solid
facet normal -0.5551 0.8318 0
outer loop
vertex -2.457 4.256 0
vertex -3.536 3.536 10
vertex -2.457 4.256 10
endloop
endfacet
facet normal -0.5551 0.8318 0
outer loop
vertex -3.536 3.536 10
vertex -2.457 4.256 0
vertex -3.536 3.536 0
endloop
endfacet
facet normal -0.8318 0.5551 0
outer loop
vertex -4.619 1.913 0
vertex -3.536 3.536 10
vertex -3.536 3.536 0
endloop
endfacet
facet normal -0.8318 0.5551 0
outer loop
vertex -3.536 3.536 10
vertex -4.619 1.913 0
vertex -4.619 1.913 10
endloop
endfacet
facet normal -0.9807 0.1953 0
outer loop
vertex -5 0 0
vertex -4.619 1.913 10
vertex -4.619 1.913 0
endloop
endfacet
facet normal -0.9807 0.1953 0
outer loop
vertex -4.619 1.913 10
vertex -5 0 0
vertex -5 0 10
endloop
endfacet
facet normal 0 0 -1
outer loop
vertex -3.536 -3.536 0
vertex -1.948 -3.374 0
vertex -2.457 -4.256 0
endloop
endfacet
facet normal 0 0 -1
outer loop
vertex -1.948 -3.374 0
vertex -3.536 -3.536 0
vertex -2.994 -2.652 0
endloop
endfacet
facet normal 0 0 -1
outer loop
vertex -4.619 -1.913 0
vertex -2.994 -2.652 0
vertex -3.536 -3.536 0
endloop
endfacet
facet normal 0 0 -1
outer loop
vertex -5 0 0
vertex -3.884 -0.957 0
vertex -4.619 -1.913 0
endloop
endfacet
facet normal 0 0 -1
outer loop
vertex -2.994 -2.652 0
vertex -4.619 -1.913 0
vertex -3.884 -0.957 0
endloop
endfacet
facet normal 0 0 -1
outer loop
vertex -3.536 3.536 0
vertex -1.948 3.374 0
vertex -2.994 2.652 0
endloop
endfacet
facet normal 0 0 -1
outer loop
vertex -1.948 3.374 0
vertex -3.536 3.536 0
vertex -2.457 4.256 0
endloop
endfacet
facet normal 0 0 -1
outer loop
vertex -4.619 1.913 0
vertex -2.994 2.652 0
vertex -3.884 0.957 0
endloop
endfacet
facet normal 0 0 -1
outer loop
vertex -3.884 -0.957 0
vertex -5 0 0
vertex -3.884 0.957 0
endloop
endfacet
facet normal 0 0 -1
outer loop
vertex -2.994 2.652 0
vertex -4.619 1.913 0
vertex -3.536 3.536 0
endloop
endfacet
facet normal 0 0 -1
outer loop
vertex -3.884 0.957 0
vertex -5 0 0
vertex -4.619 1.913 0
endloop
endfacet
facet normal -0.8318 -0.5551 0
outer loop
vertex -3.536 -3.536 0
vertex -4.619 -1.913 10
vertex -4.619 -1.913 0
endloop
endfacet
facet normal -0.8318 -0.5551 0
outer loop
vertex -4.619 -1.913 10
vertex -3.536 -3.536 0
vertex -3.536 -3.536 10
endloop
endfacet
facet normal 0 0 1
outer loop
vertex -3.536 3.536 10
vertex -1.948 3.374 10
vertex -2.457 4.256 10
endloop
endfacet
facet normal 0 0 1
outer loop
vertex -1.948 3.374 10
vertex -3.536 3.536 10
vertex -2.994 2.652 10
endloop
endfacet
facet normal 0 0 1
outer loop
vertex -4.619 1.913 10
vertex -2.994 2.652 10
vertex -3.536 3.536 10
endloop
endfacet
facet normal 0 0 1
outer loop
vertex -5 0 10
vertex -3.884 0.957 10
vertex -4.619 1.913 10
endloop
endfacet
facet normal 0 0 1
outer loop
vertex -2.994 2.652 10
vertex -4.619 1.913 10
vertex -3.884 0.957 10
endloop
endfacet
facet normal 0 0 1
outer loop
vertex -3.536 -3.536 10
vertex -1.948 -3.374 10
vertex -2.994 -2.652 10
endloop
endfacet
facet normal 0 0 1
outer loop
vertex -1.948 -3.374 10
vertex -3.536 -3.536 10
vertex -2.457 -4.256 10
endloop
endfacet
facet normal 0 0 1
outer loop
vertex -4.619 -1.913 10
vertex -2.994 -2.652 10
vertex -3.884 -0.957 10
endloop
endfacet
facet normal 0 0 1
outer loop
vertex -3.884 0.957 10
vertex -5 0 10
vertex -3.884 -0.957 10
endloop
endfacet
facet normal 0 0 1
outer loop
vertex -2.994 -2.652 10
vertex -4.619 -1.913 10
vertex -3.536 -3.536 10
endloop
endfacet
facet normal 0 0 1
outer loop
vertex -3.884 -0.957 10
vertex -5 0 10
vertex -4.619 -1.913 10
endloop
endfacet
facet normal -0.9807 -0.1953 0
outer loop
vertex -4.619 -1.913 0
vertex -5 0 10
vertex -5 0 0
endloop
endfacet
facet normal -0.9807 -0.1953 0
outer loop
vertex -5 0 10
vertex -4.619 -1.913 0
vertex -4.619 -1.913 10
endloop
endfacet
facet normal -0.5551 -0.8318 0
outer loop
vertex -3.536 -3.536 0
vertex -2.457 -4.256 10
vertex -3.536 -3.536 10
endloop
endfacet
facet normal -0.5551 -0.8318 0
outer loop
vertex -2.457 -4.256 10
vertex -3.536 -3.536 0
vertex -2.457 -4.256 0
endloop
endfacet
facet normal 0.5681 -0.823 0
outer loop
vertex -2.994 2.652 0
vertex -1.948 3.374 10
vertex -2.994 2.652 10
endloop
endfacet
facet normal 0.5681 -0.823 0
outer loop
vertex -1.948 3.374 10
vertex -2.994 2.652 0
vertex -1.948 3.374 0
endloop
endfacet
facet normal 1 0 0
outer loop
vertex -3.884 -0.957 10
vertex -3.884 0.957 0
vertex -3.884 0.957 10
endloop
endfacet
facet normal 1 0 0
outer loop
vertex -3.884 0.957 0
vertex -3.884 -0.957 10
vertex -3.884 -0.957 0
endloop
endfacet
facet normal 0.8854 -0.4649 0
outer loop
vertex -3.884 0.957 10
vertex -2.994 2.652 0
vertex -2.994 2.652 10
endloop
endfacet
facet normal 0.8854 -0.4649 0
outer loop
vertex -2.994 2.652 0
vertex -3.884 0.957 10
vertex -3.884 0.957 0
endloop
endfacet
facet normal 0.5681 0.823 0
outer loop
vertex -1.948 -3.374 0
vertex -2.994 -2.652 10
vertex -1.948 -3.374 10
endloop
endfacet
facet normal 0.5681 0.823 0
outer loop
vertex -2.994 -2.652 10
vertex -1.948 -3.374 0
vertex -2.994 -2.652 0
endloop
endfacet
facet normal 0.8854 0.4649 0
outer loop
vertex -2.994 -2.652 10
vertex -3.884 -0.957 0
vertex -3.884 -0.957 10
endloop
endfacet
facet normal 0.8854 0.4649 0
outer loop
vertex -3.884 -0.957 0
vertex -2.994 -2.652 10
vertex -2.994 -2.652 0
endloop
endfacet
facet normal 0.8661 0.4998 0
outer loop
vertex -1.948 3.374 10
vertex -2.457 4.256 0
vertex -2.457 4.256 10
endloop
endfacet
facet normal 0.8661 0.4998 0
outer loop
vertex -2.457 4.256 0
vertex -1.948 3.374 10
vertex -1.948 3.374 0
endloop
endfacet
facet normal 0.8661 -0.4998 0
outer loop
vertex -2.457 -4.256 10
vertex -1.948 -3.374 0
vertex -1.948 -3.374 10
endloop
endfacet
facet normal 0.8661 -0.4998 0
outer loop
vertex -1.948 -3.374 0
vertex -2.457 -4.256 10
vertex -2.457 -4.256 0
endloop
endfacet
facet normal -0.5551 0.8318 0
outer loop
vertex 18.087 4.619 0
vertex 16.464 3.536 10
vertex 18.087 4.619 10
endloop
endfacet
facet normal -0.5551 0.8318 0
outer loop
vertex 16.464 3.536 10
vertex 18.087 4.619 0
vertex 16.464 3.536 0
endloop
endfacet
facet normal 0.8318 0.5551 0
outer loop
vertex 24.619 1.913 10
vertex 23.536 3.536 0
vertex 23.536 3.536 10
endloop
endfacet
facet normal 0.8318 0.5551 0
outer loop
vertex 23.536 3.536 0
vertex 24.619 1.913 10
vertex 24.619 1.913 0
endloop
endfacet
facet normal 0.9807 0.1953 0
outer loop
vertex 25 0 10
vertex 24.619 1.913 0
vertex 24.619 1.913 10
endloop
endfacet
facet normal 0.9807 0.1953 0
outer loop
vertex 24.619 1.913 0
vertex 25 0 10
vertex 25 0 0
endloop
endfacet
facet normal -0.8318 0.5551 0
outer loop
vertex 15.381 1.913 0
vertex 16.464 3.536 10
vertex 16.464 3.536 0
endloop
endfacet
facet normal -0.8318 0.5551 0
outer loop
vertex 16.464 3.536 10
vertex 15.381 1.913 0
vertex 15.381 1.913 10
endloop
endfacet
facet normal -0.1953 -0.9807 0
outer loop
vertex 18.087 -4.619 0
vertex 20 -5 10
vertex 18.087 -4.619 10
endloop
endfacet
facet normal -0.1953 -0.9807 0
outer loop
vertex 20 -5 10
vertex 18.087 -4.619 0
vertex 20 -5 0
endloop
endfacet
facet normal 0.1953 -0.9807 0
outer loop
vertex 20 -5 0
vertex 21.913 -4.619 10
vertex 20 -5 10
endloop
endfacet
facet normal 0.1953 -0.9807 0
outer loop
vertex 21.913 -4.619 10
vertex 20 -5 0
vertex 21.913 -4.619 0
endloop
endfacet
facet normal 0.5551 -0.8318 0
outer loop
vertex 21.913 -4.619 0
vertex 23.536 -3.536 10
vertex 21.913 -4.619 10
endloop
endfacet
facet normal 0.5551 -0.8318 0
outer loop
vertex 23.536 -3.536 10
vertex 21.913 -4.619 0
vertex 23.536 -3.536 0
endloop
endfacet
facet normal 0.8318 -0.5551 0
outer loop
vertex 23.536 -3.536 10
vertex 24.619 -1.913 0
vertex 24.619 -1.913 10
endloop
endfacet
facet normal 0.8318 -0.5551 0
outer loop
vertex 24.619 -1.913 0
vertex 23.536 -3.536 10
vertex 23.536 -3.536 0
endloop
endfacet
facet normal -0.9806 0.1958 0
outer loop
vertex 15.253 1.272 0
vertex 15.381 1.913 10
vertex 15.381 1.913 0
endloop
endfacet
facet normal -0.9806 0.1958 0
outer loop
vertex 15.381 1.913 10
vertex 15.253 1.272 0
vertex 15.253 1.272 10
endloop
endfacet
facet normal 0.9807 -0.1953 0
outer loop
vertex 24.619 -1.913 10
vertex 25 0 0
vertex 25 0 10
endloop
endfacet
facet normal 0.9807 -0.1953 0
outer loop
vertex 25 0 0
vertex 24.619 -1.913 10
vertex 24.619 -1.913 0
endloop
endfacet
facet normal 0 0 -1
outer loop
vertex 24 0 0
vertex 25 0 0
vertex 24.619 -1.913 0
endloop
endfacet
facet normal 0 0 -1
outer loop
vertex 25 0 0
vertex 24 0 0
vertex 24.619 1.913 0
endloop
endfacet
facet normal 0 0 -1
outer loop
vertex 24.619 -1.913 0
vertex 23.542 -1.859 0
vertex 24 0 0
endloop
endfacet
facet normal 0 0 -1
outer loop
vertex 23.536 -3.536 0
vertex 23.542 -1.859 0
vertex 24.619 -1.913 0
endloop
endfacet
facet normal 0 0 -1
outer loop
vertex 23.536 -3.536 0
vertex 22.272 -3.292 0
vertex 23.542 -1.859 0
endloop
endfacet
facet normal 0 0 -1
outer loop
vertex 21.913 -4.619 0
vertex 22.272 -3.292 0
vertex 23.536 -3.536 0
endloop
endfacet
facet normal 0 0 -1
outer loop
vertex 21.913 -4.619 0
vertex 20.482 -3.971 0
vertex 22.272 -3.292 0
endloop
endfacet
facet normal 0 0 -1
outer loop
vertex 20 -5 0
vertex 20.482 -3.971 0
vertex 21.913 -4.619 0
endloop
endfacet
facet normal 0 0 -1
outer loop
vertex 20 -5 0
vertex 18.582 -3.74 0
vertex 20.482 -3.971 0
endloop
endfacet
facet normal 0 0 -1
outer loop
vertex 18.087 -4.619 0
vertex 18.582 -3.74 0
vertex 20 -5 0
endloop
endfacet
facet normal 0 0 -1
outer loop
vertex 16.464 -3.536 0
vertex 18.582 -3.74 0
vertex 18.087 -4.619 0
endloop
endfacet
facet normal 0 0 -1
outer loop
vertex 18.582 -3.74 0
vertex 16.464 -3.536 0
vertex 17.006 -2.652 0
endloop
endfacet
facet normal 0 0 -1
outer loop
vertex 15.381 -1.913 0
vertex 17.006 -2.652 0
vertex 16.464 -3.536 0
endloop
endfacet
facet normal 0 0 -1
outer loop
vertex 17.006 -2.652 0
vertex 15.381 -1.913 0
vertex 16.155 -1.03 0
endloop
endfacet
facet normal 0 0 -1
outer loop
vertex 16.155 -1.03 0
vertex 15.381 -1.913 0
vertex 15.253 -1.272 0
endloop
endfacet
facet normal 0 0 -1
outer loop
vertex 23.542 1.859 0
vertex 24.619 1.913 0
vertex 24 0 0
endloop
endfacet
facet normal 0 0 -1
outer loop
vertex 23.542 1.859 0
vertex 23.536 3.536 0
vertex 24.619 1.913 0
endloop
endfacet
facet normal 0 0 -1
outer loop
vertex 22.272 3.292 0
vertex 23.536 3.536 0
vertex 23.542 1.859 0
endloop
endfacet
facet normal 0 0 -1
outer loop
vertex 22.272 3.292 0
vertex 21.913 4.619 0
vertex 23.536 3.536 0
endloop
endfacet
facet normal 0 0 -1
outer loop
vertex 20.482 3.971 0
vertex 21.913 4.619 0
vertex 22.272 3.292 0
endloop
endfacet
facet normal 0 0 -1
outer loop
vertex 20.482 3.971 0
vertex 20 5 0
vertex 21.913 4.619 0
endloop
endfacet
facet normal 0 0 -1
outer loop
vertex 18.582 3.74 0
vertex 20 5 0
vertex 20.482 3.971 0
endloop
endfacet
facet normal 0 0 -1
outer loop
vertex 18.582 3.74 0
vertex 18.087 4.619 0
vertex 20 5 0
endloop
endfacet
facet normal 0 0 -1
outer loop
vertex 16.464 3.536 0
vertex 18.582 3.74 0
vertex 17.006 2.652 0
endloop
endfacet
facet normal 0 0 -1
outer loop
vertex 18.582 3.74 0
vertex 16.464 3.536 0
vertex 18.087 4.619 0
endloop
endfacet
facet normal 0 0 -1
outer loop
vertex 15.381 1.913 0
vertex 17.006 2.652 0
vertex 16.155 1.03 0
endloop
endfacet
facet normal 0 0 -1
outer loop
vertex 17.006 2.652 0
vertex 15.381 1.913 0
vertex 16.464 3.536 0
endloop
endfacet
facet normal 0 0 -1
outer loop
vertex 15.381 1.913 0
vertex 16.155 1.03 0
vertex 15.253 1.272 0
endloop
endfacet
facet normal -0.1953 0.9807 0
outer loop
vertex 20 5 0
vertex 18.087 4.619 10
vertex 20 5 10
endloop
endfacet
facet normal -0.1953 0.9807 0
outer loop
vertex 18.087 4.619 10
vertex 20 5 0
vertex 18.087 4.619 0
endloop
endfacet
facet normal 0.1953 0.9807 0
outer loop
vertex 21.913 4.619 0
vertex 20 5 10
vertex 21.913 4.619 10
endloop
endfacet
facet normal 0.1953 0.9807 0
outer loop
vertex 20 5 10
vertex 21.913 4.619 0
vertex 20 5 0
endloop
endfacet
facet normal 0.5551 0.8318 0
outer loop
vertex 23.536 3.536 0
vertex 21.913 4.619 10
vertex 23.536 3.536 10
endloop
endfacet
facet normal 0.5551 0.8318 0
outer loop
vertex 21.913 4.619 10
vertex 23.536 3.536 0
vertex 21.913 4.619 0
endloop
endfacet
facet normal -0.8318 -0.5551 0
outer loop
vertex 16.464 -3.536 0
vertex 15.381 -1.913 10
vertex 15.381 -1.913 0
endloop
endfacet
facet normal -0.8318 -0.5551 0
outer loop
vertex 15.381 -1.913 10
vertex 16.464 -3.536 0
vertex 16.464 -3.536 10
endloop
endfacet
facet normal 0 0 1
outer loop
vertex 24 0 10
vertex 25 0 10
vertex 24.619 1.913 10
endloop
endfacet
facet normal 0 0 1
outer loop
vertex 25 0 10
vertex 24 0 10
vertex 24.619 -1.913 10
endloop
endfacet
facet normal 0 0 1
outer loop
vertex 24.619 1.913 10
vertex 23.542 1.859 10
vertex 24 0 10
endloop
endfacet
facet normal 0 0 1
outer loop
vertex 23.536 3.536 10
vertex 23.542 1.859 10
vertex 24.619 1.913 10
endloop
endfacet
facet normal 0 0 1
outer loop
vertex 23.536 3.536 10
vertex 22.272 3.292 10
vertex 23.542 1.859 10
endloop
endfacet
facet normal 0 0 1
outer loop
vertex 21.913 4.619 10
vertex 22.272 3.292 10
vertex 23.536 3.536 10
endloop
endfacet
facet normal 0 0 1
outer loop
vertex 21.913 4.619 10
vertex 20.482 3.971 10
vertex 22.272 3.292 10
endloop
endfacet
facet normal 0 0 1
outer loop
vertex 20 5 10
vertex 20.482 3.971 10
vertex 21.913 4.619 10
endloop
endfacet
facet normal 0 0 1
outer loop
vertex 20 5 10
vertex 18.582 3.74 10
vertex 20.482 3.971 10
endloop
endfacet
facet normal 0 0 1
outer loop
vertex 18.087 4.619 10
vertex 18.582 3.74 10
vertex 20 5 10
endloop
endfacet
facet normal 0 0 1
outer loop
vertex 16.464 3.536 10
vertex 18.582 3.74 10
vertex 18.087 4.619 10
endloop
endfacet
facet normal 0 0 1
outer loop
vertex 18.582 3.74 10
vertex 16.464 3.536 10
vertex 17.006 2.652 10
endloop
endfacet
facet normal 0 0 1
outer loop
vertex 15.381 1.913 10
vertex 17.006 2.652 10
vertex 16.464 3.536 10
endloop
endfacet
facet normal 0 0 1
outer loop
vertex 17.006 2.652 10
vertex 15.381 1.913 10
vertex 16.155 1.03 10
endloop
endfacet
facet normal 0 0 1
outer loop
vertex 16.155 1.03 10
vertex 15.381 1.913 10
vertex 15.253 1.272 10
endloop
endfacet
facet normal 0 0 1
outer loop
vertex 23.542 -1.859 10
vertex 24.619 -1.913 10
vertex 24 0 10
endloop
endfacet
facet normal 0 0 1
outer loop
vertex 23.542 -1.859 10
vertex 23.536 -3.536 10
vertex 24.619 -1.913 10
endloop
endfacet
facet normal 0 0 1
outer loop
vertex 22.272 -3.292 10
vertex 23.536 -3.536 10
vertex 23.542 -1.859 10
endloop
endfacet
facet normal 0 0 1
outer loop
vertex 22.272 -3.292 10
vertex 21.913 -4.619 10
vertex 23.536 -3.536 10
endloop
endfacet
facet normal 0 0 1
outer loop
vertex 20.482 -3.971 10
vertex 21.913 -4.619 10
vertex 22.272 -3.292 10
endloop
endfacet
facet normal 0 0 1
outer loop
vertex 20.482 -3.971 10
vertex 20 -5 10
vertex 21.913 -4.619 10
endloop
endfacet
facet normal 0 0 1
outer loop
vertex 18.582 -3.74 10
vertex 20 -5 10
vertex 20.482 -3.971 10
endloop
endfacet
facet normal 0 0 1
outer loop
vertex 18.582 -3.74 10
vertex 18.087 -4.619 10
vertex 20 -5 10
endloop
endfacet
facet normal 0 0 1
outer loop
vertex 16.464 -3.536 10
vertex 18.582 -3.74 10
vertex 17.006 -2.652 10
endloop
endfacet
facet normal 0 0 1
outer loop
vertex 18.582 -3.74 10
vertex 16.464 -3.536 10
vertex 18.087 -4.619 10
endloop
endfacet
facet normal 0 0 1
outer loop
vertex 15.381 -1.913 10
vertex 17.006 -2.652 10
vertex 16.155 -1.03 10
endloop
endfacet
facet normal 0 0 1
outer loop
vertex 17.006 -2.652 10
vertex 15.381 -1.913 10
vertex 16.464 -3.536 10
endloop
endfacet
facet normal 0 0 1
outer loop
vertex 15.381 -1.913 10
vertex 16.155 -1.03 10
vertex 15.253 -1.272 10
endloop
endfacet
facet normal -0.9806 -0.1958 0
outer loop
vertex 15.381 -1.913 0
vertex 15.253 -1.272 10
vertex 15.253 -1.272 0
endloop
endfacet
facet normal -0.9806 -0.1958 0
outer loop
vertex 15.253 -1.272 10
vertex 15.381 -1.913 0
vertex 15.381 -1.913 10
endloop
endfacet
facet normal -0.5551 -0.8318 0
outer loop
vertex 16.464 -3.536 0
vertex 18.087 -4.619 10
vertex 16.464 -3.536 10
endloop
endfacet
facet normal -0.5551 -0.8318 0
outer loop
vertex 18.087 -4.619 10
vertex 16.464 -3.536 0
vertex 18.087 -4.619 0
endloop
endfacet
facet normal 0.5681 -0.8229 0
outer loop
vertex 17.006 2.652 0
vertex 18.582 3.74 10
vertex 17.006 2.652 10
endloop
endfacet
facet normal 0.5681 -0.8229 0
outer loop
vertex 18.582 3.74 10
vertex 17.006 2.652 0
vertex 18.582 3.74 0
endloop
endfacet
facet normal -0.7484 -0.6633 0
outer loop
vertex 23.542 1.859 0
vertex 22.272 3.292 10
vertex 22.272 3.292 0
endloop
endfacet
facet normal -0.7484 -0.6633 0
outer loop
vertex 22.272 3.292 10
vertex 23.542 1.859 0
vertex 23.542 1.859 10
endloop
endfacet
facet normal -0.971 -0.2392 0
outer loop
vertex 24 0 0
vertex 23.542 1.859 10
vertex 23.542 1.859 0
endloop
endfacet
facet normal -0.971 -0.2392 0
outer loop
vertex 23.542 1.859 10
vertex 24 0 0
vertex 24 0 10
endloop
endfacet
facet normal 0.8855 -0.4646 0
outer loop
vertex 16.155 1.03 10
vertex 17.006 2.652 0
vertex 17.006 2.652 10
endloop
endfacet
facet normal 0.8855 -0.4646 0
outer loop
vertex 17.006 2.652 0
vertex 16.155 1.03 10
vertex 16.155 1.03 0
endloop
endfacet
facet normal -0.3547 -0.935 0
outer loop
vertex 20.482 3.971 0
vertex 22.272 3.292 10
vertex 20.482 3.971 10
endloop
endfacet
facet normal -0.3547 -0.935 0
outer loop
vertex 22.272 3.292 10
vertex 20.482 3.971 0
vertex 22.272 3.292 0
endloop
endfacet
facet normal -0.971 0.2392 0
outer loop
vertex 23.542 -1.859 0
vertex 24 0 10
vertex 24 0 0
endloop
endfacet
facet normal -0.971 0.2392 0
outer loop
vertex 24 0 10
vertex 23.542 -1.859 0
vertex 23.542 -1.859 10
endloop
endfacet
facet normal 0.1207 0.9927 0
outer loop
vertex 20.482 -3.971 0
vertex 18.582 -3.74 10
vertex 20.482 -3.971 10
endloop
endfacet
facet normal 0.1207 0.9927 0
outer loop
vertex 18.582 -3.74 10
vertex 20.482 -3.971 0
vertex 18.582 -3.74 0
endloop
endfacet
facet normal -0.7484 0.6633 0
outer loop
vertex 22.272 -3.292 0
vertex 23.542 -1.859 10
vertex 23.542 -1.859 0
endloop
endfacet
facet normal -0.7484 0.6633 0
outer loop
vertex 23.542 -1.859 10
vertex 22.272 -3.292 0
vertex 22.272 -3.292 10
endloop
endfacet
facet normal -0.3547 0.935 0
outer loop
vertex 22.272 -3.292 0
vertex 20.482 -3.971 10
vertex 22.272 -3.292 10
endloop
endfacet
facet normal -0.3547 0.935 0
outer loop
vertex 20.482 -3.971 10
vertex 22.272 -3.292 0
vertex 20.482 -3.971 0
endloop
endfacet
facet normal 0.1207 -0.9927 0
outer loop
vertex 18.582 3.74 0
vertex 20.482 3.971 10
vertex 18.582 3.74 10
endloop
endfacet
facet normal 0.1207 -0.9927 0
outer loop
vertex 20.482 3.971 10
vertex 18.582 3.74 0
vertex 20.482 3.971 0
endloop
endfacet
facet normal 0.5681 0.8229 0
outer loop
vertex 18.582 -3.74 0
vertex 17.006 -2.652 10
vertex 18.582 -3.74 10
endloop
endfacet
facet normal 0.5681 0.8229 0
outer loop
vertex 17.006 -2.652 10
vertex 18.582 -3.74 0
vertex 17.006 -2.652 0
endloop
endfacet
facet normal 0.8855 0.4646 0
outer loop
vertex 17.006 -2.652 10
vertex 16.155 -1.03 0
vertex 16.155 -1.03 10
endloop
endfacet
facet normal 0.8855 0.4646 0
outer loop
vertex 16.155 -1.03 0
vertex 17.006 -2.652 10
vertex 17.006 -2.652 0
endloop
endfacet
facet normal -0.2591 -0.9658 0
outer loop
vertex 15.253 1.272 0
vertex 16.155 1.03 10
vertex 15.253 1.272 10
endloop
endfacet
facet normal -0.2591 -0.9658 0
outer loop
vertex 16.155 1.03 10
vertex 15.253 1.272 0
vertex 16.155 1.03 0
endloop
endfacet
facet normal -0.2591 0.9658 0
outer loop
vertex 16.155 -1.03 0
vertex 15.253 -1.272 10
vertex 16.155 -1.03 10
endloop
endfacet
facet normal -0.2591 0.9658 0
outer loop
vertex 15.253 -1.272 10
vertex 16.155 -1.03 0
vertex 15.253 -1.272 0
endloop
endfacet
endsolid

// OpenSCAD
// parameters
R_OUTER = 5;
R_INNER = 4;
HEIGHT = 10;
ANGLE1 = 120;
ANGLE2 = 330;

module Pipe(r_outer, r_inner, height) {
    difference() {
        cylinder(r=r_outer, h=height);
        cylinder(r=r_inner, h=height);
    }
}

module Prism(l, w, h) {
    polyhedron(
       points=[[0,0,0], [l,0,0], [0,w,0], [0,w,h], [l,0,h], [0,0,h]],
       faces=[[0,1,2],[0,5,4,1],[1,4,3,2],[2,3,5,0],[3,4,5]]
   );
}

module EquilateralPrism(a, h){
    union() {
        Prism(l=sqrt(3)/2*a, w=a/2, h=h);
        mirror([0, 1, 0])
            Prism(l=sqrt(3)/2*a, w=a/2, h=h);
    }
}

module ArcOfCylinder(r_outer, r_inner, height, angle) {

    prism_angle = angle>=180? 360 - angle: angle;
    bottom_edge_length = 2 * r_outer * sin(prism_angle / 2);
    r_ircumscribed_circle = sqrt(3) / 4 * bottom_edge_length;
    triangle_height = (sqrt(3) / 2 * bottom_edge_length);
    target_trinangle_height = (r_outer * cos(prism_angle / 2));
    x_scale = target_trinangle_height / triangle_height;

    // if angle is over 180 then get difference in pipe, prism and cube.
    // else, get intersection in pipe and (prism and cube).
    if (angle >= 180) {

        difference() {
            Pipe(r_outer=r_outer, r_inner=r_inner, height=height);
            translate([-target_trinangle_height, 0, 0])
                scale([x_scale, 1, 1])
                    EquilateralPrism(a=bottom_edge_length, h=height);
            translate([-(target_trinangle_height+r_outer/2), 0, height/2])
                cube([r_outer, bottom_edge_length, height], center=true);
        }

    } else {

        intersection() {
            Pipe(r_outer=r_outer, r_inner=r_inner, height=height);
            union() {
                translate([-target_trinangle_height, 0, 0])
                    scale([x_scale, 1, 1])
                        EquilateralPrism(a=bottom_edge_length, h=height);
                translate([-(target_trinangle_height+r_outer/2), 0, height/2])
                    cube([r_outer, bottom_edge_length, height], center=true);
            }
        }

    }
}

// main
ArcOfCylinder(R_OUTER, R_INNER, HEIGHT, ANGLE1);
translate([20, 0, 0])
    ArcOfCylinder(R_OUTER, R_INNER, HEIGHT, ANGLE2);
